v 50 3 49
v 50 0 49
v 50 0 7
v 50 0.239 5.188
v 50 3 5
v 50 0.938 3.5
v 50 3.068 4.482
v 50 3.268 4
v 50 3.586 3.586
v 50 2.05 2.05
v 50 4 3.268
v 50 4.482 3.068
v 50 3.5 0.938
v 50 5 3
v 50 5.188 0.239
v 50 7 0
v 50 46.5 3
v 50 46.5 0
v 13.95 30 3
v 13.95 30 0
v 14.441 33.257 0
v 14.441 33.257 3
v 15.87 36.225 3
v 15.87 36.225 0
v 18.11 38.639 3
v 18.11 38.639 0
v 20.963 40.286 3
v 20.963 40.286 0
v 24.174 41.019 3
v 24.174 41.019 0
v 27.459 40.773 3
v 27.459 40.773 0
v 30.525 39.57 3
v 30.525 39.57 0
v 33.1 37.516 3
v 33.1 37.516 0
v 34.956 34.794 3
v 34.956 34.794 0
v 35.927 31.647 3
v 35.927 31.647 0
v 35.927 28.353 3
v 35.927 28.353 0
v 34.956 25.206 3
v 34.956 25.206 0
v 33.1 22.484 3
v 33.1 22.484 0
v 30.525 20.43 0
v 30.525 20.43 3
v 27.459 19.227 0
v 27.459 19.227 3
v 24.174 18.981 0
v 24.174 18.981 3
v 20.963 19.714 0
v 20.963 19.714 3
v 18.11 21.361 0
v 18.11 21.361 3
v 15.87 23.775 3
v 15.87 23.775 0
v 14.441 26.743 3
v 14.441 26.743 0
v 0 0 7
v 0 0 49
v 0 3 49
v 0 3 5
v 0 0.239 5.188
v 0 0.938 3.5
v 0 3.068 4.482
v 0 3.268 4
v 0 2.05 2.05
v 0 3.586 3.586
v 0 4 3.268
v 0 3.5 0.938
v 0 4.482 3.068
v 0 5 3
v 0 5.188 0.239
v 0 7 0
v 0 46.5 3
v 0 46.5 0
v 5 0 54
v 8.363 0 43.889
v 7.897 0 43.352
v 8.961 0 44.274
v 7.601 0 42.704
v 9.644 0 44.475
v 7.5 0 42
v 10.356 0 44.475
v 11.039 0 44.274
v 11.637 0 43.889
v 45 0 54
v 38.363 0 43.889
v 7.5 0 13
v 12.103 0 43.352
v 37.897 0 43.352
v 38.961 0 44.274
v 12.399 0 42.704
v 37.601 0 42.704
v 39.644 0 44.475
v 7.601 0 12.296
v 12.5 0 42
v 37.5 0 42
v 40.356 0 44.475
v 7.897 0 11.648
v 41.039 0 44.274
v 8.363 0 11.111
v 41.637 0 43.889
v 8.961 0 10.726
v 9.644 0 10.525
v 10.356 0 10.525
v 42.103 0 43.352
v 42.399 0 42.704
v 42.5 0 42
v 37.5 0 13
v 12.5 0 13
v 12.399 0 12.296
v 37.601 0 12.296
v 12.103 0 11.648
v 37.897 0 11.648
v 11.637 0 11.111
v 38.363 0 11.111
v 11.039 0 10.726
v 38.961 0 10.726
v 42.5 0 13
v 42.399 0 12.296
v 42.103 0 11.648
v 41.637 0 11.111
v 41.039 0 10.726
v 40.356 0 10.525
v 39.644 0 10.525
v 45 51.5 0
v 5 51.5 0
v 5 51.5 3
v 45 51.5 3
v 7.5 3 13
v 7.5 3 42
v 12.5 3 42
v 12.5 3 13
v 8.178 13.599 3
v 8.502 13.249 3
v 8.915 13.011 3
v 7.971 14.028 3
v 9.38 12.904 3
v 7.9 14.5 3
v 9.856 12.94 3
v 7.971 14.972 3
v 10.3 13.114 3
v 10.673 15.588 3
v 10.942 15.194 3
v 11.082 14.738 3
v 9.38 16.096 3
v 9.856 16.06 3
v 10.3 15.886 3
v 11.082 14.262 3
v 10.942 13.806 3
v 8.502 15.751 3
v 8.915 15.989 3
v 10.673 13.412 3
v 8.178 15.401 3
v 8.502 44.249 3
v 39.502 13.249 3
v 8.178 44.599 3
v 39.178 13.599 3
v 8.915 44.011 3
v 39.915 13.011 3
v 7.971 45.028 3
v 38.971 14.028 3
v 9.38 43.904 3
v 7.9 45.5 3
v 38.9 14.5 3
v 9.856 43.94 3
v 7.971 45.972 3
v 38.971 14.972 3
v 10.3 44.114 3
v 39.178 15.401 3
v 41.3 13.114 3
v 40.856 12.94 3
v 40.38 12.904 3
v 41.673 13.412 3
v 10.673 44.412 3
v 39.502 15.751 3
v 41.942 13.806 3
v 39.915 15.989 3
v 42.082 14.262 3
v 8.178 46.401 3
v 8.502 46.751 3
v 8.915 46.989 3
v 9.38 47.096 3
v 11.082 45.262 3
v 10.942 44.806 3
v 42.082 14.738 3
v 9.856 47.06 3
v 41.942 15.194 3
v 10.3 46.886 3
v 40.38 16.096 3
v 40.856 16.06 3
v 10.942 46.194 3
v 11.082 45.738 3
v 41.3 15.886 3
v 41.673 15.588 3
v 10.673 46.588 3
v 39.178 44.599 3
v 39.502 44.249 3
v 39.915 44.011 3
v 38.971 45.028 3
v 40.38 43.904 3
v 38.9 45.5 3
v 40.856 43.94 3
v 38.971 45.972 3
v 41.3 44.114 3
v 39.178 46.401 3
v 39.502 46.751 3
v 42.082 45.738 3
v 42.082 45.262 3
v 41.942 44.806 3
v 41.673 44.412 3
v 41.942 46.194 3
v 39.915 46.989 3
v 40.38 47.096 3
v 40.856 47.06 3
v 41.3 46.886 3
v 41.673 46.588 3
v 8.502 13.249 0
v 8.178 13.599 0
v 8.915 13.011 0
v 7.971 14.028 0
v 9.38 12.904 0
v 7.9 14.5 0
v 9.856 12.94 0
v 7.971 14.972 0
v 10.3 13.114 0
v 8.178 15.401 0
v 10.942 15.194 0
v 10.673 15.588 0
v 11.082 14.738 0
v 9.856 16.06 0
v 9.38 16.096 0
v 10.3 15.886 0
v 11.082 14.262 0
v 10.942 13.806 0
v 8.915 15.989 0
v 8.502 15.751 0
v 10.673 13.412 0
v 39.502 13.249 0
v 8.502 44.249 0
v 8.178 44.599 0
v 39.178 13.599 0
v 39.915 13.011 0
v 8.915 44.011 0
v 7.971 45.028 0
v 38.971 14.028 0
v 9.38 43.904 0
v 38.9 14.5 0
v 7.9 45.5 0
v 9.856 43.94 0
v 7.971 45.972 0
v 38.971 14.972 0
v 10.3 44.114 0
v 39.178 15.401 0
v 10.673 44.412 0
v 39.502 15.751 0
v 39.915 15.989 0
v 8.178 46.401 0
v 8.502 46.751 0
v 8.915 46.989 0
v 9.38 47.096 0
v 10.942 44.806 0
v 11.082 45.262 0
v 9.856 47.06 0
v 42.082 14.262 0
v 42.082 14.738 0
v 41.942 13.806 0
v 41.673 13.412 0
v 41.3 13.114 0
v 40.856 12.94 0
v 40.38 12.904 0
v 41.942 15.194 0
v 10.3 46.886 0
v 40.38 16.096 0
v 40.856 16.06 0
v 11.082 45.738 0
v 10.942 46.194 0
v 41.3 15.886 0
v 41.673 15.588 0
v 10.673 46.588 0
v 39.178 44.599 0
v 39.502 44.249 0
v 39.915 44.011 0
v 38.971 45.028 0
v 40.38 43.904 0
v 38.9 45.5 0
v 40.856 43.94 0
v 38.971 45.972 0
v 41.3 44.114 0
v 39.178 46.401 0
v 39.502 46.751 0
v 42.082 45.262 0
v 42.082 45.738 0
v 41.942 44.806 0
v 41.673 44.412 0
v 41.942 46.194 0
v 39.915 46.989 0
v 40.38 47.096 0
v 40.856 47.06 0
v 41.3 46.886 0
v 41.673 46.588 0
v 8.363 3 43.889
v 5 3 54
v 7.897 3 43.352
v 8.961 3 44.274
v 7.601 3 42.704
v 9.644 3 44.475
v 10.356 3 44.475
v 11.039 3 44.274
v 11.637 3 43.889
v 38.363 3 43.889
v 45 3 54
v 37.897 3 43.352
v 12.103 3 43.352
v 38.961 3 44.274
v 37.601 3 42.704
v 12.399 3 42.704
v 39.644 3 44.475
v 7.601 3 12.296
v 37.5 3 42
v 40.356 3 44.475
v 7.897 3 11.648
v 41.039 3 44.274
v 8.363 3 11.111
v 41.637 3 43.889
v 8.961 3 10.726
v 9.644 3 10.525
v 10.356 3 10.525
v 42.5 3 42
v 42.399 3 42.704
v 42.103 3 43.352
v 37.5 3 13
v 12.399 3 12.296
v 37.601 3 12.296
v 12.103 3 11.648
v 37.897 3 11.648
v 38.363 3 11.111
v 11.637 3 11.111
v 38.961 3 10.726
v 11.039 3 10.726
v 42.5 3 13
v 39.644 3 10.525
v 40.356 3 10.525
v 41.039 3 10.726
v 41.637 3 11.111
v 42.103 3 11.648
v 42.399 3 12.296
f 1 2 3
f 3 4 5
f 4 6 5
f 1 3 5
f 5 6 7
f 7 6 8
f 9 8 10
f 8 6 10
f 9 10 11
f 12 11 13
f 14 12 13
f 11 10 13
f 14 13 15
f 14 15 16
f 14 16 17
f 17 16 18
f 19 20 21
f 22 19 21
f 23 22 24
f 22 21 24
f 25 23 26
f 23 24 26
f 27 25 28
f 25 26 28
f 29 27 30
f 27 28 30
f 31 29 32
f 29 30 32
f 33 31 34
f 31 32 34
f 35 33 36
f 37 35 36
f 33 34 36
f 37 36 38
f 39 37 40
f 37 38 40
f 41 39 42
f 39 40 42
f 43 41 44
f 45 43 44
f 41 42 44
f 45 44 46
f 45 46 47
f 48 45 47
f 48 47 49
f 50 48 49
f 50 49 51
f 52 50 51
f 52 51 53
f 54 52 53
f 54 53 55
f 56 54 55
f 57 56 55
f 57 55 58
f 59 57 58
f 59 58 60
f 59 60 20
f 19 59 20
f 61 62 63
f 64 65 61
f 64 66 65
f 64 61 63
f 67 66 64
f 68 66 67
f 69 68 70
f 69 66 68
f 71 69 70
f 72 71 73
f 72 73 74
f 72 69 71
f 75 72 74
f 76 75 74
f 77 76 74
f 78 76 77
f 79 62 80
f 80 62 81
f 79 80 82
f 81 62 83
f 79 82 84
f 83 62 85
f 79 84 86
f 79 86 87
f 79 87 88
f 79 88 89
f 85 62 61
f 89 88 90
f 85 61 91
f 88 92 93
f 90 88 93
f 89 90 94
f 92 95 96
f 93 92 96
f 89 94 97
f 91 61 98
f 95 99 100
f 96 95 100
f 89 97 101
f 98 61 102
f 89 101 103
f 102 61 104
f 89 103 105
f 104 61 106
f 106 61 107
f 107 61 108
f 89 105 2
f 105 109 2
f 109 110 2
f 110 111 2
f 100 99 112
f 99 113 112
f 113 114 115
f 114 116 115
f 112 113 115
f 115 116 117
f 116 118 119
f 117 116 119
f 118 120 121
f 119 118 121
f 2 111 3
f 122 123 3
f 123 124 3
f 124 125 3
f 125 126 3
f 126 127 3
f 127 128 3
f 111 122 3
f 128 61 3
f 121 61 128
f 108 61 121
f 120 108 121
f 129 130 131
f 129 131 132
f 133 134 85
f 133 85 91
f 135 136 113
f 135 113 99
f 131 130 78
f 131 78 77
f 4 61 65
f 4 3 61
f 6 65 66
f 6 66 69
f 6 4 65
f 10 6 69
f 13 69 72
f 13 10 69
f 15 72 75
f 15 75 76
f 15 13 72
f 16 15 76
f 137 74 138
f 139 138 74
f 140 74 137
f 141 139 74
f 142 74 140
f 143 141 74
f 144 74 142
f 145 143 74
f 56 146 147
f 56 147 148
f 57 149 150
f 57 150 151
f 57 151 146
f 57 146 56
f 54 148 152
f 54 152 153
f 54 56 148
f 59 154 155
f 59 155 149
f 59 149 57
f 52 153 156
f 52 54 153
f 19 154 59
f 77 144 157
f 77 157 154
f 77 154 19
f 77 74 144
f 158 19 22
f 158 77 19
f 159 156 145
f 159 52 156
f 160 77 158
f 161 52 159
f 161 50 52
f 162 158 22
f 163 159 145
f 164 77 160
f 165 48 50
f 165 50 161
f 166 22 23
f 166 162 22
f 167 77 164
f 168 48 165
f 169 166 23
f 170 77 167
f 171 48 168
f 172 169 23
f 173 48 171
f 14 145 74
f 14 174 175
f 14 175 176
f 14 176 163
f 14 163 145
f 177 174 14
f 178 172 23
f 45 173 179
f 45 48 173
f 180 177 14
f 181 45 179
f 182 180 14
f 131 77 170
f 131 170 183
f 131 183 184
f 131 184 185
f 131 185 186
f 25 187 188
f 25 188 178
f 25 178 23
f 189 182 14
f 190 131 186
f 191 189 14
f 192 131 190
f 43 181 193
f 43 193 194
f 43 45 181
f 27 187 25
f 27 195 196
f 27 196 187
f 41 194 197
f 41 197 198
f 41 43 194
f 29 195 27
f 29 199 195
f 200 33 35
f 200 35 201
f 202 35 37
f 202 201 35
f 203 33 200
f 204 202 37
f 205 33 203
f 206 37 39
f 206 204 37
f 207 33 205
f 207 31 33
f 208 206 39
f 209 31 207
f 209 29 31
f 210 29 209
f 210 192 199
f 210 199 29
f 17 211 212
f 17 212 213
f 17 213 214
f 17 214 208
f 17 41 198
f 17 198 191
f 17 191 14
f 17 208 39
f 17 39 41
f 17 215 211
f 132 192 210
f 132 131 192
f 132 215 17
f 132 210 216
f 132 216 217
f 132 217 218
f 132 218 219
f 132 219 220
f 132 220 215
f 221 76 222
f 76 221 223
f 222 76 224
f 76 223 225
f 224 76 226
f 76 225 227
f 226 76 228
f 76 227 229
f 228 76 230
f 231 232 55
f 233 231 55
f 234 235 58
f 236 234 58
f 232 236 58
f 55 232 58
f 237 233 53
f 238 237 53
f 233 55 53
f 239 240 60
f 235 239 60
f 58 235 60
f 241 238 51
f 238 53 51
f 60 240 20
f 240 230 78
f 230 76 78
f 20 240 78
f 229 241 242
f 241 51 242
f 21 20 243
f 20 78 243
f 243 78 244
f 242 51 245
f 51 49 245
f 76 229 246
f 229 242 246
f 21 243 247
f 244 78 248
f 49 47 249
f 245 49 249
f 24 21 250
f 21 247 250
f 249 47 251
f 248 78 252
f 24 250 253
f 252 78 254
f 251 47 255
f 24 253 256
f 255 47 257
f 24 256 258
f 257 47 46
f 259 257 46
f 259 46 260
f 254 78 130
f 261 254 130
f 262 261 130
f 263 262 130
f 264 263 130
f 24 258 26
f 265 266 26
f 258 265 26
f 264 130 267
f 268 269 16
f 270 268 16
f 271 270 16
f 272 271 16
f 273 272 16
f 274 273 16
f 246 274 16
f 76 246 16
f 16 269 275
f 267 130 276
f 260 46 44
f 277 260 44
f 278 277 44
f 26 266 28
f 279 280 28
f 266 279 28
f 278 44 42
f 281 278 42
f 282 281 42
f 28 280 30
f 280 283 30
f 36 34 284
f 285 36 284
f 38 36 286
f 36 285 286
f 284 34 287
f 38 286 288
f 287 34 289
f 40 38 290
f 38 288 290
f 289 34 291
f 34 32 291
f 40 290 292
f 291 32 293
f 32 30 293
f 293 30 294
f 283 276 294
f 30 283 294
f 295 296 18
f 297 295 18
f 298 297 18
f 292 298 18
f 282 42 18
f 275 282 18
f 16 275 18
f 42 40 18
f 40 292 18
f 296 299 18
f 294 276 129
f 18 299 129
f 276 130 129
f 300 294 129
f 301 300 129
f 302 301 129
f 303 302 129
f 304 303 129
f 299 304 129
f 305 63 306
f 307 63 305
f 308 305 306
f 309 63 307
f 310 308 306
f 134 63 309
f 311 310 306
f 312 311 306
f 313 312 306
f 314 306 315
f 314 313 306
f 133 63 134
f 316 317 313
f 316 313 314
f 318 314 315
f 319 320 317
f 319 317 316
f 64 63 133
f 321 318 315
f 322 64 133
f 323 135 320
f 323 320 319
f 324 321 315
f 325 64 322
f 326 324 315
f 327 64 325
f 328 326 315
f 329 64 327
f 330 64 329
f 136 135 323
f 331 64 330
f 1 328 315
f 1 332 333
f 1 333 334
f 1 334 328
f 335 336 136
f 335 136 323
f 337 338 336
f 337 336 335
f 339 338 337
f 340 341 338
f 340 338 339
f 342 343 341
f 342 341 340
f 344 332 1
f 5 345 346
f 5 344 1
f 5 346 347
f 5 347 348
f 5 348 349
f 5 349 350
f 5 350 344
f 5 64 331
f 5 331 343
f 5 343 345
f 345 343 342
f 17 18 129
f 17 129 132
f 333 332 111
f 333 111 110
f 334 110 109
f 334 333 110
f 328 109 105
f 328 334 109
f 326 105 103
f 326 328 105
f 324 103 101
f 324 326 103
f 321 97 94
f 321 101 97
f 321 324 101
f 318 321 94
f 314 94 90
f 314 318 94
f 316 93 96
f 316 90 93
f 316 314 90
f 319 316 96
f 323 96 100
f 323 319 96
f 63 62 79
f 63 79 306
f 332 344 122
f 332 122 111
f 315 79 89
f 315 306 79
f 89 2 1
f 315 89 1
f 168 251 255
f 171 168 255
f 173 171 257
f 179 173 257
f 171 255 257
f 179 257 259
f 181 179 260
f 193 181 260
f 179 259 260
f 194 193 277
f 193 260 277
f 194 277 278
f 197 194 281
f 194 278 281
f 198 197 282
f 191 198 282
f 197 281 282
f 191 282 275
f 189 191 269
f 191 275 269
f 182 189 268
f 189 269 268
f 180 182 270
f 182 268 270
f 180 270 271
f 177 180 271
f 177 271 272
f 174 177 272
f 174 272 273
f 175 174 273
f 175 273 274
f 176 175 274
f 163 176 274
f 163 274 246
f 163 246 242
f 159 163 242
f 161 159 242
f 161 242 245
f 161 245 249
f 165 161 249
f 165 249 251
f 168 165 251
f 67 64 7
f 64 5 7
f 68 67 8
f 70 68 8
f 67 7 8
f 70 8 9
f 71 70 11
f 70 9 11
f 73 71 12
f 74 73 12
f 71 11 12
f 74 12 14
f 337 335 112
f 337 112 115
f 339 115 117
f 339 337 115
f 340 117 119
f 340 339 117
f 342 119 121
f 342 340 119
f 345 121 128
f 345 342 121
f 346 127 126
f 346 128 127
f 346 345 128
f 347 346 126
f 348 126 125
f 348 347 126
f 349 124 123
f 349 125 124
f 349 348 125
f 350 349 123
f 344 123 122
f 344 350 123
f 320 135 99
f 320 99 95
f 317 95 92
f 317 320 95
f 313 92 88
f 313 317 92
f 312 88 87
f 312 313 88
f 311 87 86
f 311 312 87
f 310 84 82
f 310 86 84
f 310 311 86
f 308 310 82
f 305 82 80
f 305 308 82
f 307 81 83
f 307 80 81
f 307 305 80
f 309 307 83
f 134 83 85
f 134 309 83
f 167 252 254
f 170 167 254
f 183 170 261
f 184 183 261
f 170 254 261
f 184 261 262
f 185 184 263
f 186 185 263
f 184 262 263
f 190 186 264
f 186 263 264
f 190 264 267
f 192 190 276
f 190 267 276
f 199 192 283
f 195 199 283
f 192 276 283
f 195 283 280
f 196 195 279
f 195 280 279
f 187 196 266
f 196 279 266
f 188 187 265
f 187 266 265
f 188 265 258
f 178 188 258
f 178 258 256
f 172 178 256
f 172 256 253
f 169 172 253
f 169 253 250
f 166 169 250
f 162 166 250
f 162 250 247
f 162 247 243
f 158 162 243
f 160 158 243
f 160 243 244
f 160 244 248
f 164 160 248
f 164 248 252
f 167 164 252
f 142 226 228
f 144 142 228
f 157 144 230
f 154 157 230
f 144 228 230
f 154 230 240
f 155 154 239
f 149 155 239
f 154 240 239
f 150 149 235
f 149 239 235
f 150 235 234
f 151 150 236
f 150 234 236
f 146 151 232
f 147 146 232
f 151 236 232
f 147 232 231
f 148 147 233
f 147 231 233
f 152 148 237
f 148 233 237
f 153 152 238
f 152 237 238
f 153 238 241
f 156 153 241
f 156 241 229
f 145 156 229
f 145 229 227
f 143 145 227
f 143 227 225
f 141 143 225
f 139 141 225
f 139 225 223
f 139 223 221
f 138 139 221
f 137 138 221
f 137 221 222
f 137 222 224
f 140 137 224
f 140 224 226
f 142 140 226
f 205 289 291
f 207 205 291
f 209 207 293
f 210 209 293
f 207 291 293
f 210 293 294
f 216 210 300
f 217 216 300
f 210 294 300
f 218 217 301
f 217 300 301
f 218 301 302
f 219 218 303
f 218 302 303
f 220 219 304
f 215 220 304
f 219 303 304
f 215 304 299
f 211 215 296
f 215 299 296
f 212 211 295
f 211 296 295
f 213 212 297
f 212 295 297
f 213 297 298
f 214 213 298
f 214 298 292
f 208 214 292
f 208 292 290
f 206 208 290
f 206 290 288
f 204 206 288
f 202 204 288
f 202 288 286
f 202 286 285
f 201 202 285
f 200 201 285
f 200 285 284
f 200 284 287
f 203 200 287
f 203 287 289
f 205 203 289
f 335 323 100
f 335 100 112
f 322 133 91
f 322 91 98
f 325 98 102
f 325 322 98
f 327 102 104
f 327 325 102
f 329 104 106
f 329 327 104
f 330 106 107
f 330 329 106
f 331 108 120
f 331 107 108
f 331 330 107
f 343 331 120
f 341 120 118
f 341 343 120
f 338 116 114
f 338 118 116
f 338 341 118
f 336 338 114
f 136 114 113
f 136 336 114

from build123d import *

# Parameters (mm, degrees)
SKETCH1_W           = 50
SKETCH1_H           = 51.5
BOSS_EXTRUDE1_DEPTH = 3
SKETCH2_W           = 50
SKETCH2_H           = 3
BOSS_EXTRUDE2_DEPTH = 51
SKETCH3_R           = 11.05
SKETCH3_R_2         = 1.6
CUT_EXTRUDE1_DEPTH  = 90.823437921
CUT_EXTRUDE2_DEPTH  = 89.137676393
CHAMFER1_SIZE       = 5
FILLET1_R           = 7
FILLET2_R           = 2


with BuildPart() as part:
    # Sketch1 → Boss-Extrude1 (new body)
    with BuildSketch(Plane.XY):
        with Locations((25, 25.75)):
            Rectangle(SKETCH1_W, SKETCH1_H)
    extrude(amount=BOSS_EXTRUDE1_DEPTH)

    # Sketch2 → Boss-Extrude2 (add)
    with BuildSketch(Plane.XY.offset(3)):
        with Locations((25, 1.5)):
            Rectangle(SKETCH2_W, SKETCH2_H)
    extrude(amount=BOSS_EXTRUDE2_DEPTH)

    # Sketch3 → Cut-Extrude1 (cut, through all)
    with BuildSketch(Plane(origin=(0, 0, 0), x_dir=(-1, 0, 0), z_dir=(0, 0, -1))):
        with Locations((-25, 30)):
            Circle(SKETCH3_R)
        with Locations((-40.5, 45.5)):
            Circle(SKETCH3_R_2)
        with Locations((-9.5, 45.5)):
            Circle(SKETCH3_R_2)
        with Locations((-9.5, 14.5)):
            Circle(SKETCH3_R_2)
        with Locations((-40.5, 14.5)):
            Circle(SKETCH3_R_2)
    extrude(amount=-CUT_EXTRUDE1_DEPTH, mode=Mode.SUBTRACT)

    # Sketch4 → Cut-Extrude2 (cut, through all)
    with BuildSketch(Plane(origin=(0, 3, 0), x_dir=(1, 0, 0), z_dir=(0, 1, 0))):
        with BuildLine():
            Line((12.5, -13), (12.5, -42))
            ThreePointArc((12.5, -42), (10, -44.5), (7.5, -42))
            Line((7.5, -42), (7.5, -13))
            ThreePointArc((7.5, -13), (10, -10.5), (12.5, -13))
        make_face()
        with BuildLine():
            Line((37.5, -42), (37.5, -13))
            ThreePointArc((37.5, -13), (40, -10.5), (42.5, -13))
            Line((42.5, -13), (42.5, -42))
            ThreePointArc((42.5, -42), (40, -44.5), (37.5, -42))
        make_face()
    extrude(amount=-CUT_EXTRUDE2_DEPTH, mode=Mode.SUBTRACT)

    # Chamfer1
    chamfer1_edges = [part.edges().sort_by_distance(p)[0] for p in [
        (0, 1.5, 54),
        (50, 1.5, 54),
        (0, 51.5, 1.5),
        (50, 51.5, 1.5),
    ]]
    chamfer(chamfer1_edges, length=CHAMFER1_SIZE)

    # Fillet1
    fillet1_edges = [part.edges().sort_by_distance(p)[0] for p in [
        (25, 0, 0),
    ]]
    fillet(fillet1_edges, radius=FILLET1_R)

    # Fillet2
    fillet2_edges = [part.edges().sort_by_distance(p)[0] for p in [
        (25, 3, 3),
    ]]
    fillet(fillet2_edges, radius=FILLET2_R)


solid = part.part
